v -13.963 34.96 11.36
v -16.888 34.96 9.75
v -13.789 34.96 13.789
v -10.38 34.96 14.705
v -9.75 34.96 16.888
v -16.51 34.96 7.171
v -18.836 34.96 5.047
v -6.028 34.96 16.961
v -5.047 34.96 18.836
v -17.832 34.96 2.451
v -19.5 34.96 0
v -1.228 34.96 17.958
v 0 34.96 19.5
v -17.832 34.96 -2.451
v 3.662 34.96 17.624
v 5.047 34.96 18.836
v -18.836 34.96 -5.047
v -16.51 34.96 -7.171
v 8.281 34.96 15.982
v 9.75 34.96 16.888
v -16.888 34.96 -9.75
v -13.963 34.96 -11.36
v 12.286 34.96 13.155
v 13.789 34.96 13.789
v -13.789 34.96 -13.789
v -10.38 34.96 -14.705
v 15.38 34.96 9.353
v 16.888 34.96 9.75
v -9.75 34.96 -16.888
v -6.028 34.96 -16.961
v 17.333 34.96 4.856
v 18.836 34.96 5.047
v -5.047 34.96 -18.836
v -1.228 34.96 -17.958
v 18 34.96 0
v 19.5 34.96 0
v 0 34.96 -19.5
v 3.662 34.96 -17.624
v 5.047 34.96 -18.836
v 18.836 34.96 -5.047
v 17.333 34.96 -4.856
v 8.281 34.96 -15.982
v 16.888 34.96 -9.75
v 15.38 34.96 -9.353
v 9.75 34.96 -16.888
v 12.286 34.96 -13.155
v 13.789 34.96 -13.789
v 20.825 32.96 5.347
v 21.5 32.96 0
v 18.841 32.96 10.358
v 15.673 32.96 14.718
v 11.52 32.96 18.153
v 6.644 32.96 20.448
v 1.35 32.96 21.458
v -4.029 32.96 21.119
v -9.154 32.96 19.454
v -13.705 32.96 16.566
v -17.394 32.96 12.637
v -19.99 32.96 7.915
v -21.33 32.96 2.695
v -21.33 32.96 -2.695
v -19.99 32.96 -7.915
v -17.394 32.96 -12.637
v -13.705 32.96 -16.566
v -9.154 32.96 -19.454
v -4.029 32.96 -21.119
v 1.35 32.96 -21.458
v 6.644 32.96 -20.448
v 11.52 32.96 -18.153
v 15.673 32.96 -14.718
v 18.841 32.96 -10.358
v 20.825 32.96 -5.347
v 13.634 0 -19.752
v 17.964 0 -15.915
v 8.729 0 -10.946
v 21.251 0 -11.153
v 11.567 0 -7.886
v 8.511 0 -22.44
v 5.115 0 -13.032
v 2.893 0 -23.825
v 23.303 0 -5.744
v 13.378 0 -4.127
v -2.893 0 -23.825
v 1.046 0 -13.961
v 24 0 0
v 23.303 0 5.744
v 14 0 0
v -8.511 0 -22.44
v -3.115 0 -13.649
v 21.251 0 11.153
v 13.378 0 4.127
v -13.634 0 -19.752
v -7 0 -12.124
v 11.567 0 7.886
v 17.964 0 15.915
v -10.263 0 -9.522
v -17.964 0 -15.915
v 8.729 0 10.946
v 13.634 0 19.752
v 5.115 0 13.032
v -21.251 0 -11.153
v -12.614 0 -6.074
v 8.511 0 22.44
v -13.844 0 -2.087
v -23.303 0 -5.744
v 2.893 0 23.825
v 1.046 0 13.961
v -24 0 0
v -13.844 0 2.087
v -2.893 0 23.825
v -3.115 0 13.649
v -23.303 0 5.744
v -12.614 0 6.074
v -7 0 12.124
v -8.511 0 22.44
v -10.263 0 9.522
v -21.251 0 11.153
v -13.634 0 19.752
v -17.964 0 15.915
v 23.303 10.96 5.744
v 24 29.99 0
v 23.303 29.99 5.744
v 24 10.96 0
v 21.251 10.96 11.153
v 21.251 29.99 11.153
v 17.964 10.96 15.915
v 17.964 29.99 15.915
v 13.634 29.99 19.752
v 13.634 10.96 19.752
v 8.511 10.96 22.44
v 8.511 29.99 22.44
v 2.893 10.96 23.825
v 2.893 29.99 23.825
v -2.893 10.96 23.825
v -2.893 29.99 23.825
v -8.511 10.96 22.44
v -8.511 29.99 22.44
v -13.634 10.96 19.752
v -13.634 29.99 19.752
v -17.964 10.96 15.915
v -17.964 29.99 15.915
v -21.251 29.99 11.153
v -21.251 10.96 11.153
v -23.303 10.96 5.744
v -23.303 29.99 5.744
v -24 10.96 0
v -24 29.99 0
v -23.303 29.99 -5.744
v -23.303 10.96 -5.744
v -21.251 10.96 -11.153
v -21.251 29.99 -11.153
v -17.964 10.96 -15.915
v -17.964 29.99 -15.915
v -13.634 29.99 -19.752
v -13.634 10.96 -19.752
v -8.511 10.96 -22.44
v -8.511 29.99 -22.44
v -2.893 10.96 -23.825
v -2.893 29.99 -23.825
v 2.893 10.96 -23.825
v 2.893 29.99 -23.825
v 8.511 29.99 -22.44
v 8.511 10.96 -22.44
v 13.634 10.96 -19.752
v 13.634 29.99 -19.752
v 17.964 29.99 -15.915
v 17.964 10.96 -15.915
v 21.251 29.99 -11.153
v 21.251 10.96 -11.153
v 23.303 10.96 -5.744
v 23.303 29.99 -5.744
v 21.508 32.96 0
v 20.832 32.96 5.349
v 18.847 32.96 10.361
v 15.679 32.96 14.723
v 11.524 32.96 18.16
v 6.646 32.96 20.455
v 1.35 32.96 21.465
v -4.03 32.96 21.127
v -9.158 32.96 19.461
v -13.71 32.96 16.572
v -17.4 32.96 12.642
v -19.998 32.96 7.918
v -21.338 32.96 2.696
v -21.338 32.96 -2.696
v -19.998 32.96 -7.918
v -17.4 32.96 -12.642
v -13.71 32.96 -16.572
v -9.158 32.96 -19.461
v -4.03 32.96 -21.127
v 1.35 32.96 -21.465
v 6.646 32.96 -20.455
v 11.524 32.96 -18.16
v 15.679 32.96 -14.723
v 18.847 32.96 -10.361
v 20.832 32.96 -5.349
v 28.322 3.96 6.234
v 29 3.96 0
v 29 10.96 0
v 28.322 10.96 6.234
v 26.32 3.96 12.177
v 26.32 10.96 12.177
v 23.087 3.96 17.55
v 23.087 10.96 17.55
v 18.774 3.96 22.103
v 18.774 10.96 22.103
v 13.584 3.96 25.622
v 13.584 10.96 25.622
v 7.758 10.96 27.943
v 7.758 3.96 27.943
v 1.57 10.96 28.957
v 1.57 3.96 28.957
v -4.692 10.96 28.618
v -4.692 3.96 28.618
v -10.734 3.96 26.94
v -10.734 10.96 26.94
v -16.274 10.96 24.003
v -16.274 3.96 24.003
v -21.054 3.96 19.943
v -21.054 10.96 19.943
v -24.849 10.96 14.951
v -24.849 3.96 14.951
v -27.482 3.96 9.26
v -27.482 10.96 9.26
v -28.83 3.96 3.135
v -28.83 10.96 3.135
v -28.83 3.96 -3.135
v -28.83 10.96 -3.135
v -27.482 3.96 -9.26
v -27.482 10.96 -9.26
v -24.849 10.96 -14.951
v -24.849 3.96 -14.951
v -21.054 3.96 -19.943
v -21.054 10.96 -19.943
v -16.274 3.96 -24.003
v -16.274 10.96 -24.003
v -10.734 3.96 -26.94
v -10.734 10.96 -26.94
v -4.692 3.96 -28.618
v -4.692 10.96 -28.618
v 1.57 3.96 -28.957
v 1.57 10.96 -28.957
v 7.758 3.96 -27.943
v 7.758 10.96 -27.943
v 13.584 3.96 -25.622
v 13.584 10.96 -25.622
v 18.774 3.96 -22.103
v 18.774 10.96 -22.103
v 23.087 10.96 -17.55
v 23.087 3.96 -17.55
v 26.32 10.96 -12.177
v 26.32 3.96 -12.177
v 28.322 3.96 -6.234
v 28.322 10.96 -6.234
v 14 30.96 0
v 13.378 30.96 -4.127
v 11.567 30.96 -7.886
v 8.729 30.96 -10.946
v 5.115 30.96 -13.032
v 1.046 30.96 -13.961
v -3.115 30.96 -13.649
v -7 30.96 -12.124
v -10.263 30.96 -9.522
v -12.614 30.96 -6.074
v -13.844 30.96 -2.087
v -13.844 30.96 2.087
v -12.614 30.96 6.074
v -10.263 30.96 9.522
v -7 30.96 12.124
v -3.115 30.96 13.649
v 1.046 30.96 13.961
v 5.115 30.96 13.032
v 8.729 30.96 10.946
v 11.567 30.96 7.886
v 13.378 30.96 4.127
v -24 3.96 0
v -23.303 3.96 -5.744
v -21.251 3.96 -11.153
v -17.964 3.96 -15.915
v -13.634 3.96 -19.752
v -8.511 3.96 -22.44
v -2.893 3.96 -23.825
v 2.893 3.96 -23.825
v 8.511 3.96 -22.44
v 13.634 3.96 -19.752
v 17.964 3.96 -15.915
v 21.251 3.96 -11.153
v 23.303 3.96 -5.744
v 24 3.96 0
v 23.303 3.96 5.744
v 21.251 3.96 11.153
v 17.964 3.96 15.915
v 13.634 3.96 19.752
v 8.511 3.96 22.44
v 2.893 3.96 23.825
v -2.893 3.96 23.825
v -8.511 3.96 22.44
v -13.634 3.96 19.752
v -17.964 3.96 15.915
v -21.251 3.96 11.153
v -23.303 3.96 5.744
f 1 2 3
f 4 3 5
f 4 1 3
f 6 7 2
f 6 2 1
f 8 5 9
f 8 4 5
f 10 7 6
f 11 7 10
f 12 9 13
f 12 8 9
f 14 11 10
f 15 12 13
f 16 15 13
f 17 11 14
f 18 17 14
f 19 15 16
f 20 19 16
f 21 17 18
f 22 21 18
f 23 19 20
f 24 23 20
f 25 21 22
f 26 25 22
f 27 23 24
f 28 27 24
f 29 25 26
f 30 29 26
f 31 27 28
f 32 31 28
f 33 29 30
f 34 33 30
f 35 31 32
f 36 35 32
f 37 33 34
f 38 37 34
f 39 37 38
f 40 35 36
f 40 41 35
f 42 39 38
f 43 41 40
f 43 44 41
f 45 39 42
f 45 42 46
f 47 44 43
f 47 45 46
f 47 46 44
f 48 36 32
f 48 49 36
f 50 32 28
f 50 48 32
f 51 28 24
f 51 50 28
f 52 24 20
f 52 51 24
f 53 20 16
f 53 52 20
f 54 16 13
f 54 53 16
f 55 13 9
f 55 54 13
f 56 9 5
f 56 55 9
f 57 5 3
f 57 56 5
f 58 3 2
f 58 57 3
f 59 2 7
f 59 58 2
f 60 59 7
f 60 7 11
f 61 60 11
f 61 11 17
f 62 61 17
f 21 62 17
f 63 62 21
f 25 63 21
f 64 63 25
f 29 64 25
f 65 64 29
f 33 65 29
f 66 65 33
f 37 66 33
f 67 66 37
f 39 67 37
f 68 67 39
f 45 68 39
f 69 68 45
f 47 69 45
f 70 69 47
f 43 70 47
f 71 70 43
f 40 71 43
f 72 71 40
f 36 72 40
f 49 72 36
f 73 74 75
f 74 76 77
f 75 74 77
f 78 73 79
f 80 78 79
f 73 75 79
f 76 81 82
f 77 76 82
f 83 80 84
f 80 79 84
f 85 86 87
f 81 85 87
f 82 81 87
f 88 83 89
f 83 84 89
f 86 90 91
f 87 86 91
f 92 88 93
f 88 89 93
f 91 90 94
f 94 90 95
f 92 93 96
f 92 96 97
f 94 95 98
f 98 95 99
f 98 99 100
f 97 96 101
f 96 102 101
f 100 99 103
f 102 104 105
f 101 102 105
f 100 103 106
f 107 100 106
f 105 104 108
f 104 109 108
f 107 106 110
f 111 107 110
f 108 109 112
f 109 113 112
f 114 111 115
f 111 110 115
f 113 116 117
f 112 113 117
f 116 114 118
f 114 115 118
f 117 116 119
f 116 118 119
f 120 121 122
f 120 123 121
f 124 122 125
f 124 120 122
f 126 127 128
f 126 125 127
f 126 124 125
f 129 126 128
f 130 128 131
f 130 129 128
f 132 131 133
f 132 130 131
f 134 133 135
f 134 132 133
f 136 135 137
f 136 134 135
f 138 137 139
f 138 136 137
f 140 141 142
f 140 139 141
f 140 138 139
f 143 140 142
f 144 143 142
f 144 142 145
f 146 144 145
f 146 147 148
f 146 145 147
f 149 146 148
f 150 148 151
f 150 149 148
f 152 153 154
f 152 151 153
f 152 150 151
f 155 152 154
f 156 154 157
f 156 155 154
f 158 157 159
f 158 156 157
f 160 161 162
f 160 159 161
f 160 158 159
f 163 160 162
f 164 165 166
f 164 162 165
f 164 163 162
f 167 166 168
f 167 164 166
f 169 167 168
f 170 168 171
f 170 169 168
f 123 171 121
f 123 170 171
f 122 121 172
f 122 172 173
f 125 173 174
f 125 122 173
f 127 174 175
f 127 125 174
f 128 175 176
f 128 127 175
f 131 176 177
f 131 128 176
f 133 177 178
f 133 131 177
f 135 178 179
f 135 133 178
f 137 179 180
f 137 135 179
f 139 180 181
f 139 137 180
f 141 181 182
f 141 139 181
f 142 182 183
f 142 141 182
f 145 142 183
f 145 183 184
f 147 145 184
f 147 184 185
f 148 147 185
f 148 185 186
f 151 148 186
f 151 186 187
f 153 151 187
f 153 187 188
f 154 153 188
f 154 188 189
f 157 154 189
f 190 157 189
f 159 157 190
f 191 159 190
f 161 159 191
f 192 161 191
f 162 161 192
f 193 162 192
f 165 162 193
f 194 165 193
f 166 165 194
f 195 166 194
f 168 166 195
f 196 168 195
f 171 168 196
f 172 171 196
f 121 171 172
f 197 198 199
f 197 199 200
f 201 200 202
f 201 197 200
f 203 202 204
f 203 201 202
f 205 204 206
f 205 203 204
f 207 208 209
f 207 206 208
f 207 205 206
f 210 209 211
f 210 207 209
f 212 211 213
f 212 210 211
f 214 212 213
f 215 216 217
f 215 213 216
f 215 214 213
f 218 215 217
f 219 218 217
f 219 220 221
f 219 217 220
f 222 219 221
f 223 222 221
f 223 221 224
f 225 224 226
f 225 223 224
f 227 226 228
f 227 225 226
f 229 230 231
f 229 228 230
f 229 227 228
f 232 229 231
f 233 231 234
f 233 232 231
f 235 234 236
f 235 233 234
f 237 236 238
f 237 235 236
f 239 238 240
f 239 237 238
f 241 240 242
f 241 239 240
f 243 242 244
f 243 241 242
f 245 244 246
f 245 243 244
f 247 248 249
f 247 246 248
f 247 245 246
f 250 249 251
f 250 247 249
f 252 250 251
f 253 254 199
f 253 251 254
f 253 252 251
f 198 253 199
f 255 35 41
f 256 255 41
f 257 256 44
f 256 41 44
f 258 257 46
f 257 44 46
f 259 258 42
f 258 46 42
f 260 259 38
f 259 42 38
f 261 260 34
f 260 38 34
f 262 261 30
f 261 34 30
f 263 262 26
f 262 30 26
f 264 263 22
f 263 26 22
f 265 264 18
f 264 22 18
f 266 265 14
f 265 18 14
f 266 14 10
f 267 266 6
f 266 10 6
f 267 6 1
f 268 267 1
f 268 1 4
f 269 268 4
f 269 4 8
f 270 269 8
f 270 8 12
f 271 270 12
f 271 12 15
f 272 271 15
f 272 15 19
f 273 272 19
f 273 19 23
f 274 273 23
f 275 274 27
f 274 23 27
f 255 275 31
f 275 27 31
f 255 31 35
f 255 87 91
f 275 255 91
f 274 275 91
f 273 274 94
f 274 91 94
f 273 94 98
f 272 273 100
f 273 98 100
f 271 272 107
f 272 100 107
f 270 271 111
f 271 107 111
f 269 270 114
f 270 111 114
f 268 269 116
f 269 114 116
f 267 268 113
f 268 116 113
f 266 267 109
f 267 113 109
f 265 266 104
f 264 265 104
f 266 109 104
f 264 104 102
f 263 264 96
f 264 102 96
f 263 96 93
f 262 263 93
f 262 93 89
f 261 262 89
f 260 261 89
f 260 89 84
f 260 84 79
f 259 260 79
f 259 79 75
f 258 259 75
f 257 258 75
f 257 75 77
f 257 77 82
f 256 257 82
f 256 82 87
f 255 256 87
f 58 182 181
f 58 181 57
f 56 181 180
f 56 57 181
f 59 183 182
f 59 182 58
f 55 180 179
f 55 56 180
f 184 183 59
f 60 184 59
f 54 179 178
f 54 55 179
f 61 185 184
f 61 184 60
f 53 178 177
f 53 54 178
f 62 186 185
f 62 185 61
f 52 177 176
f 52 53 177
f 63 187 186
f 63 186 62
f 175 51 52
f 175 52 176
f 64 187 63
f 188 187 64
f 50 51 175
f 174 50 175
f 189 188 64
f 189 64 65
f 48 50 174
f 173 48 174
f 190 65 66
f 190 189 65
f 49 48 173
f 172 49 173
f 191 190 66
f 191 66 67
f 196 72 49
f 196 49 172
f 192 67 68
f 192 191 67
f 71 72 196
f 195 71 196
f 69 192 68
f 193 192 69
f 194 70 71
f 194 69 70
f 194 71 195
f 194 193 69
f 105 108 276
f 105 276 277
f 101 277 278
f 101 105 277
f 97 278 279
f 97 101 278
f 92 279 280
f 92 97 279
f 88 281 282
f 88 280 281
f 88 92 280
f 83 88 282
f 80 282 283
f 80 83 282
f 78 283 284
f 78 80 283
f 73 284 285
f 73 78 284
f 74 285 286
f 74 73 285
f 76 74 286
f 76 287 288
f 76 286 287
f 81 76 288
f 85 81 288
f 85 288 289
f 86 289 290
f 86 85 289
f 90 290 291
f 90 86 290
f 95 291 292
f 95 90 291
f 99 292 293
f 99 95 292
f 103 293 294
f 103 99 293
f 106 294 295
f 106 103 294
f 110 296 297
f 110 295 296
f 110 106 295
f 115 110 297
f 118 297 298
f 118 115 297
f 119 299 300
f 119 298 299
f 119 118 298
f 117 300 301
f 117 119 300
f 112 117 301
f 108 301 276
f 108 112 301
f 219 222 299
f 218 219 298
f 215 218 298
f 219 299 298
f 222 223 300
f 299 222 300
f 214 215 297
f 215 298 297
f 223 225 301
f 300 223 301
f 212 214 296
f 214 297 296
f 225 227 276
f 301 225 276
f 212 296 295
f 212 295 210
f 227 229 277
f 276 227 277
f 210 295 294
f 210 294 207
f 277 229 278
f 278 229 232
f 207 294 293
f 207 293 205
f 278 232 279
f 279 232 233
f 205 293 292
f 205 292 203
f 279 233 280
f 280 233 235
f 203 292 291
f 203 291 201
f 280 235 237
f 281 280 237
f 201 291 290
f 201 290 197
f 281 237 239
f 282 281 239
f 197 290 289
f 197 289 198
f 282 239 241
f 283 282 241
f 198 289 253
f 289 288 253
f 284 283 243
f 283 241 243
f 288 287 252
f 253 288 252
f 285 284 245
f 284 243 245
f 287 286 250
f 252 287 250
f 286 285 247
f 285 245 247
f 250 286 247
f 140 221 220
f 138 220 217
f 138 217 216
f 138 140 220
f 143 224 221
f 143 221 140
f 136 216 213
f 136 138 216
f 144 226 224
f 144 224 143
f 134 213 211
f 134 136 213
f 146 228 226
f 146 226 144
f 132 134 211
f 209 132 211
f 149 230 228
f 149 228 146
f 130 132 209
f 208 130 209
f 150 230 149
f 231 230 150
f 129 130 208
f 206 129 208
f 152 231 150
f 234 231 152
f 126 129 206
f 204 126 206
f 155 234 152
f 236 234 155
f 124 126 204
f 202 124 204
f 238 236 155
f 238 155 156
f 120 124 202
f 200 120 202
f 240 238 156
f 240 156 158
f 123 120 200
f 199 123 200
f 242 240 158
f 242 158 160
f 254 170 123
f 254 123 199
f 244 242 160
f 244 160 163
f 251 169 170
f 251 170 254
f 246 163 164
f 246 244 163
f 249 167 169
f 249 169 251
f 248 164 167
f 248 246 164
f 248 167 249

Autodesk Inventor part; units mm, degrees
ref_plane "YZ Plane" through (0, 0, 0) normal (1, 0, 0) x (0, 1, 0)
ref_plane "XZ Plane" through (0, 0, 0) normal (0, 1, 0) x (-1, 0, 0)
ref_plane "XY Plane" through (0, 0, 0) normal (0, 0, 1) x (1, 0, 0)
sketch "Sketch1" plane through (0, 0, 0) normal (0, 1, 0) x (-1, 0, 0)
  circle A0 centre (0, 0) radius 24
  dimension "d0" = 48
extrude "Extrusion1" add sketch "Sketch1" along normal blind 3.96
sketch "Sketch2" plane through (0, 3.96, 0) normal (0, 1, 0) x (1, 0, 0)
  circle A0 centre (0, 0) radius 29
  dimension "d3" = 58
extrude "Extrusion2" add sketch "Sketch2" along normal blind 7
sketch "Sketch3" plane through (0, 10.96, 0) normal (0, 1, 0) x (1, 0, 0)
  circle A0 centre (0, 0) radius 24
  dimension "d6" = 48
extrude "Extrusion3" add sketch "Sketch3" along normal blind 22
sketch "Sketch4" plane through (0, 32.96, 0) normal (0, 1, 0) x (1, 0, 0)
  circle A0 centre (0, 0) radius 21.5
  dimension "d9" = 43
extrude "Extrusion5" add sketch "Sketch4" along normal blind 2
chamfer "Chamfer1" distance 2.97 angle 40 1 edges at (-24, 32.96, 0) measured on face at (23.9222, 25.6267, 1.9312)
chamfer "Chamfer2" distance 2 angle 45 1 edges at (-21.5, 34.96, 0)
sketch "Sketch7" plane through (0, 0, 0) normal (0, -1, 0) x (1, 0, 0)
  circle A0 centre (0, 0) radius 14
  dimension "d22" = 28
extrude "Extrusion6" cut sketch "Sketch7" against normal through all
chamfer "Chamfer3" distance 4 angle 45 1 edges at (-14, 34.96, 0)
properties part number "00.32.005 \"Bushing\"" material "Steel"
